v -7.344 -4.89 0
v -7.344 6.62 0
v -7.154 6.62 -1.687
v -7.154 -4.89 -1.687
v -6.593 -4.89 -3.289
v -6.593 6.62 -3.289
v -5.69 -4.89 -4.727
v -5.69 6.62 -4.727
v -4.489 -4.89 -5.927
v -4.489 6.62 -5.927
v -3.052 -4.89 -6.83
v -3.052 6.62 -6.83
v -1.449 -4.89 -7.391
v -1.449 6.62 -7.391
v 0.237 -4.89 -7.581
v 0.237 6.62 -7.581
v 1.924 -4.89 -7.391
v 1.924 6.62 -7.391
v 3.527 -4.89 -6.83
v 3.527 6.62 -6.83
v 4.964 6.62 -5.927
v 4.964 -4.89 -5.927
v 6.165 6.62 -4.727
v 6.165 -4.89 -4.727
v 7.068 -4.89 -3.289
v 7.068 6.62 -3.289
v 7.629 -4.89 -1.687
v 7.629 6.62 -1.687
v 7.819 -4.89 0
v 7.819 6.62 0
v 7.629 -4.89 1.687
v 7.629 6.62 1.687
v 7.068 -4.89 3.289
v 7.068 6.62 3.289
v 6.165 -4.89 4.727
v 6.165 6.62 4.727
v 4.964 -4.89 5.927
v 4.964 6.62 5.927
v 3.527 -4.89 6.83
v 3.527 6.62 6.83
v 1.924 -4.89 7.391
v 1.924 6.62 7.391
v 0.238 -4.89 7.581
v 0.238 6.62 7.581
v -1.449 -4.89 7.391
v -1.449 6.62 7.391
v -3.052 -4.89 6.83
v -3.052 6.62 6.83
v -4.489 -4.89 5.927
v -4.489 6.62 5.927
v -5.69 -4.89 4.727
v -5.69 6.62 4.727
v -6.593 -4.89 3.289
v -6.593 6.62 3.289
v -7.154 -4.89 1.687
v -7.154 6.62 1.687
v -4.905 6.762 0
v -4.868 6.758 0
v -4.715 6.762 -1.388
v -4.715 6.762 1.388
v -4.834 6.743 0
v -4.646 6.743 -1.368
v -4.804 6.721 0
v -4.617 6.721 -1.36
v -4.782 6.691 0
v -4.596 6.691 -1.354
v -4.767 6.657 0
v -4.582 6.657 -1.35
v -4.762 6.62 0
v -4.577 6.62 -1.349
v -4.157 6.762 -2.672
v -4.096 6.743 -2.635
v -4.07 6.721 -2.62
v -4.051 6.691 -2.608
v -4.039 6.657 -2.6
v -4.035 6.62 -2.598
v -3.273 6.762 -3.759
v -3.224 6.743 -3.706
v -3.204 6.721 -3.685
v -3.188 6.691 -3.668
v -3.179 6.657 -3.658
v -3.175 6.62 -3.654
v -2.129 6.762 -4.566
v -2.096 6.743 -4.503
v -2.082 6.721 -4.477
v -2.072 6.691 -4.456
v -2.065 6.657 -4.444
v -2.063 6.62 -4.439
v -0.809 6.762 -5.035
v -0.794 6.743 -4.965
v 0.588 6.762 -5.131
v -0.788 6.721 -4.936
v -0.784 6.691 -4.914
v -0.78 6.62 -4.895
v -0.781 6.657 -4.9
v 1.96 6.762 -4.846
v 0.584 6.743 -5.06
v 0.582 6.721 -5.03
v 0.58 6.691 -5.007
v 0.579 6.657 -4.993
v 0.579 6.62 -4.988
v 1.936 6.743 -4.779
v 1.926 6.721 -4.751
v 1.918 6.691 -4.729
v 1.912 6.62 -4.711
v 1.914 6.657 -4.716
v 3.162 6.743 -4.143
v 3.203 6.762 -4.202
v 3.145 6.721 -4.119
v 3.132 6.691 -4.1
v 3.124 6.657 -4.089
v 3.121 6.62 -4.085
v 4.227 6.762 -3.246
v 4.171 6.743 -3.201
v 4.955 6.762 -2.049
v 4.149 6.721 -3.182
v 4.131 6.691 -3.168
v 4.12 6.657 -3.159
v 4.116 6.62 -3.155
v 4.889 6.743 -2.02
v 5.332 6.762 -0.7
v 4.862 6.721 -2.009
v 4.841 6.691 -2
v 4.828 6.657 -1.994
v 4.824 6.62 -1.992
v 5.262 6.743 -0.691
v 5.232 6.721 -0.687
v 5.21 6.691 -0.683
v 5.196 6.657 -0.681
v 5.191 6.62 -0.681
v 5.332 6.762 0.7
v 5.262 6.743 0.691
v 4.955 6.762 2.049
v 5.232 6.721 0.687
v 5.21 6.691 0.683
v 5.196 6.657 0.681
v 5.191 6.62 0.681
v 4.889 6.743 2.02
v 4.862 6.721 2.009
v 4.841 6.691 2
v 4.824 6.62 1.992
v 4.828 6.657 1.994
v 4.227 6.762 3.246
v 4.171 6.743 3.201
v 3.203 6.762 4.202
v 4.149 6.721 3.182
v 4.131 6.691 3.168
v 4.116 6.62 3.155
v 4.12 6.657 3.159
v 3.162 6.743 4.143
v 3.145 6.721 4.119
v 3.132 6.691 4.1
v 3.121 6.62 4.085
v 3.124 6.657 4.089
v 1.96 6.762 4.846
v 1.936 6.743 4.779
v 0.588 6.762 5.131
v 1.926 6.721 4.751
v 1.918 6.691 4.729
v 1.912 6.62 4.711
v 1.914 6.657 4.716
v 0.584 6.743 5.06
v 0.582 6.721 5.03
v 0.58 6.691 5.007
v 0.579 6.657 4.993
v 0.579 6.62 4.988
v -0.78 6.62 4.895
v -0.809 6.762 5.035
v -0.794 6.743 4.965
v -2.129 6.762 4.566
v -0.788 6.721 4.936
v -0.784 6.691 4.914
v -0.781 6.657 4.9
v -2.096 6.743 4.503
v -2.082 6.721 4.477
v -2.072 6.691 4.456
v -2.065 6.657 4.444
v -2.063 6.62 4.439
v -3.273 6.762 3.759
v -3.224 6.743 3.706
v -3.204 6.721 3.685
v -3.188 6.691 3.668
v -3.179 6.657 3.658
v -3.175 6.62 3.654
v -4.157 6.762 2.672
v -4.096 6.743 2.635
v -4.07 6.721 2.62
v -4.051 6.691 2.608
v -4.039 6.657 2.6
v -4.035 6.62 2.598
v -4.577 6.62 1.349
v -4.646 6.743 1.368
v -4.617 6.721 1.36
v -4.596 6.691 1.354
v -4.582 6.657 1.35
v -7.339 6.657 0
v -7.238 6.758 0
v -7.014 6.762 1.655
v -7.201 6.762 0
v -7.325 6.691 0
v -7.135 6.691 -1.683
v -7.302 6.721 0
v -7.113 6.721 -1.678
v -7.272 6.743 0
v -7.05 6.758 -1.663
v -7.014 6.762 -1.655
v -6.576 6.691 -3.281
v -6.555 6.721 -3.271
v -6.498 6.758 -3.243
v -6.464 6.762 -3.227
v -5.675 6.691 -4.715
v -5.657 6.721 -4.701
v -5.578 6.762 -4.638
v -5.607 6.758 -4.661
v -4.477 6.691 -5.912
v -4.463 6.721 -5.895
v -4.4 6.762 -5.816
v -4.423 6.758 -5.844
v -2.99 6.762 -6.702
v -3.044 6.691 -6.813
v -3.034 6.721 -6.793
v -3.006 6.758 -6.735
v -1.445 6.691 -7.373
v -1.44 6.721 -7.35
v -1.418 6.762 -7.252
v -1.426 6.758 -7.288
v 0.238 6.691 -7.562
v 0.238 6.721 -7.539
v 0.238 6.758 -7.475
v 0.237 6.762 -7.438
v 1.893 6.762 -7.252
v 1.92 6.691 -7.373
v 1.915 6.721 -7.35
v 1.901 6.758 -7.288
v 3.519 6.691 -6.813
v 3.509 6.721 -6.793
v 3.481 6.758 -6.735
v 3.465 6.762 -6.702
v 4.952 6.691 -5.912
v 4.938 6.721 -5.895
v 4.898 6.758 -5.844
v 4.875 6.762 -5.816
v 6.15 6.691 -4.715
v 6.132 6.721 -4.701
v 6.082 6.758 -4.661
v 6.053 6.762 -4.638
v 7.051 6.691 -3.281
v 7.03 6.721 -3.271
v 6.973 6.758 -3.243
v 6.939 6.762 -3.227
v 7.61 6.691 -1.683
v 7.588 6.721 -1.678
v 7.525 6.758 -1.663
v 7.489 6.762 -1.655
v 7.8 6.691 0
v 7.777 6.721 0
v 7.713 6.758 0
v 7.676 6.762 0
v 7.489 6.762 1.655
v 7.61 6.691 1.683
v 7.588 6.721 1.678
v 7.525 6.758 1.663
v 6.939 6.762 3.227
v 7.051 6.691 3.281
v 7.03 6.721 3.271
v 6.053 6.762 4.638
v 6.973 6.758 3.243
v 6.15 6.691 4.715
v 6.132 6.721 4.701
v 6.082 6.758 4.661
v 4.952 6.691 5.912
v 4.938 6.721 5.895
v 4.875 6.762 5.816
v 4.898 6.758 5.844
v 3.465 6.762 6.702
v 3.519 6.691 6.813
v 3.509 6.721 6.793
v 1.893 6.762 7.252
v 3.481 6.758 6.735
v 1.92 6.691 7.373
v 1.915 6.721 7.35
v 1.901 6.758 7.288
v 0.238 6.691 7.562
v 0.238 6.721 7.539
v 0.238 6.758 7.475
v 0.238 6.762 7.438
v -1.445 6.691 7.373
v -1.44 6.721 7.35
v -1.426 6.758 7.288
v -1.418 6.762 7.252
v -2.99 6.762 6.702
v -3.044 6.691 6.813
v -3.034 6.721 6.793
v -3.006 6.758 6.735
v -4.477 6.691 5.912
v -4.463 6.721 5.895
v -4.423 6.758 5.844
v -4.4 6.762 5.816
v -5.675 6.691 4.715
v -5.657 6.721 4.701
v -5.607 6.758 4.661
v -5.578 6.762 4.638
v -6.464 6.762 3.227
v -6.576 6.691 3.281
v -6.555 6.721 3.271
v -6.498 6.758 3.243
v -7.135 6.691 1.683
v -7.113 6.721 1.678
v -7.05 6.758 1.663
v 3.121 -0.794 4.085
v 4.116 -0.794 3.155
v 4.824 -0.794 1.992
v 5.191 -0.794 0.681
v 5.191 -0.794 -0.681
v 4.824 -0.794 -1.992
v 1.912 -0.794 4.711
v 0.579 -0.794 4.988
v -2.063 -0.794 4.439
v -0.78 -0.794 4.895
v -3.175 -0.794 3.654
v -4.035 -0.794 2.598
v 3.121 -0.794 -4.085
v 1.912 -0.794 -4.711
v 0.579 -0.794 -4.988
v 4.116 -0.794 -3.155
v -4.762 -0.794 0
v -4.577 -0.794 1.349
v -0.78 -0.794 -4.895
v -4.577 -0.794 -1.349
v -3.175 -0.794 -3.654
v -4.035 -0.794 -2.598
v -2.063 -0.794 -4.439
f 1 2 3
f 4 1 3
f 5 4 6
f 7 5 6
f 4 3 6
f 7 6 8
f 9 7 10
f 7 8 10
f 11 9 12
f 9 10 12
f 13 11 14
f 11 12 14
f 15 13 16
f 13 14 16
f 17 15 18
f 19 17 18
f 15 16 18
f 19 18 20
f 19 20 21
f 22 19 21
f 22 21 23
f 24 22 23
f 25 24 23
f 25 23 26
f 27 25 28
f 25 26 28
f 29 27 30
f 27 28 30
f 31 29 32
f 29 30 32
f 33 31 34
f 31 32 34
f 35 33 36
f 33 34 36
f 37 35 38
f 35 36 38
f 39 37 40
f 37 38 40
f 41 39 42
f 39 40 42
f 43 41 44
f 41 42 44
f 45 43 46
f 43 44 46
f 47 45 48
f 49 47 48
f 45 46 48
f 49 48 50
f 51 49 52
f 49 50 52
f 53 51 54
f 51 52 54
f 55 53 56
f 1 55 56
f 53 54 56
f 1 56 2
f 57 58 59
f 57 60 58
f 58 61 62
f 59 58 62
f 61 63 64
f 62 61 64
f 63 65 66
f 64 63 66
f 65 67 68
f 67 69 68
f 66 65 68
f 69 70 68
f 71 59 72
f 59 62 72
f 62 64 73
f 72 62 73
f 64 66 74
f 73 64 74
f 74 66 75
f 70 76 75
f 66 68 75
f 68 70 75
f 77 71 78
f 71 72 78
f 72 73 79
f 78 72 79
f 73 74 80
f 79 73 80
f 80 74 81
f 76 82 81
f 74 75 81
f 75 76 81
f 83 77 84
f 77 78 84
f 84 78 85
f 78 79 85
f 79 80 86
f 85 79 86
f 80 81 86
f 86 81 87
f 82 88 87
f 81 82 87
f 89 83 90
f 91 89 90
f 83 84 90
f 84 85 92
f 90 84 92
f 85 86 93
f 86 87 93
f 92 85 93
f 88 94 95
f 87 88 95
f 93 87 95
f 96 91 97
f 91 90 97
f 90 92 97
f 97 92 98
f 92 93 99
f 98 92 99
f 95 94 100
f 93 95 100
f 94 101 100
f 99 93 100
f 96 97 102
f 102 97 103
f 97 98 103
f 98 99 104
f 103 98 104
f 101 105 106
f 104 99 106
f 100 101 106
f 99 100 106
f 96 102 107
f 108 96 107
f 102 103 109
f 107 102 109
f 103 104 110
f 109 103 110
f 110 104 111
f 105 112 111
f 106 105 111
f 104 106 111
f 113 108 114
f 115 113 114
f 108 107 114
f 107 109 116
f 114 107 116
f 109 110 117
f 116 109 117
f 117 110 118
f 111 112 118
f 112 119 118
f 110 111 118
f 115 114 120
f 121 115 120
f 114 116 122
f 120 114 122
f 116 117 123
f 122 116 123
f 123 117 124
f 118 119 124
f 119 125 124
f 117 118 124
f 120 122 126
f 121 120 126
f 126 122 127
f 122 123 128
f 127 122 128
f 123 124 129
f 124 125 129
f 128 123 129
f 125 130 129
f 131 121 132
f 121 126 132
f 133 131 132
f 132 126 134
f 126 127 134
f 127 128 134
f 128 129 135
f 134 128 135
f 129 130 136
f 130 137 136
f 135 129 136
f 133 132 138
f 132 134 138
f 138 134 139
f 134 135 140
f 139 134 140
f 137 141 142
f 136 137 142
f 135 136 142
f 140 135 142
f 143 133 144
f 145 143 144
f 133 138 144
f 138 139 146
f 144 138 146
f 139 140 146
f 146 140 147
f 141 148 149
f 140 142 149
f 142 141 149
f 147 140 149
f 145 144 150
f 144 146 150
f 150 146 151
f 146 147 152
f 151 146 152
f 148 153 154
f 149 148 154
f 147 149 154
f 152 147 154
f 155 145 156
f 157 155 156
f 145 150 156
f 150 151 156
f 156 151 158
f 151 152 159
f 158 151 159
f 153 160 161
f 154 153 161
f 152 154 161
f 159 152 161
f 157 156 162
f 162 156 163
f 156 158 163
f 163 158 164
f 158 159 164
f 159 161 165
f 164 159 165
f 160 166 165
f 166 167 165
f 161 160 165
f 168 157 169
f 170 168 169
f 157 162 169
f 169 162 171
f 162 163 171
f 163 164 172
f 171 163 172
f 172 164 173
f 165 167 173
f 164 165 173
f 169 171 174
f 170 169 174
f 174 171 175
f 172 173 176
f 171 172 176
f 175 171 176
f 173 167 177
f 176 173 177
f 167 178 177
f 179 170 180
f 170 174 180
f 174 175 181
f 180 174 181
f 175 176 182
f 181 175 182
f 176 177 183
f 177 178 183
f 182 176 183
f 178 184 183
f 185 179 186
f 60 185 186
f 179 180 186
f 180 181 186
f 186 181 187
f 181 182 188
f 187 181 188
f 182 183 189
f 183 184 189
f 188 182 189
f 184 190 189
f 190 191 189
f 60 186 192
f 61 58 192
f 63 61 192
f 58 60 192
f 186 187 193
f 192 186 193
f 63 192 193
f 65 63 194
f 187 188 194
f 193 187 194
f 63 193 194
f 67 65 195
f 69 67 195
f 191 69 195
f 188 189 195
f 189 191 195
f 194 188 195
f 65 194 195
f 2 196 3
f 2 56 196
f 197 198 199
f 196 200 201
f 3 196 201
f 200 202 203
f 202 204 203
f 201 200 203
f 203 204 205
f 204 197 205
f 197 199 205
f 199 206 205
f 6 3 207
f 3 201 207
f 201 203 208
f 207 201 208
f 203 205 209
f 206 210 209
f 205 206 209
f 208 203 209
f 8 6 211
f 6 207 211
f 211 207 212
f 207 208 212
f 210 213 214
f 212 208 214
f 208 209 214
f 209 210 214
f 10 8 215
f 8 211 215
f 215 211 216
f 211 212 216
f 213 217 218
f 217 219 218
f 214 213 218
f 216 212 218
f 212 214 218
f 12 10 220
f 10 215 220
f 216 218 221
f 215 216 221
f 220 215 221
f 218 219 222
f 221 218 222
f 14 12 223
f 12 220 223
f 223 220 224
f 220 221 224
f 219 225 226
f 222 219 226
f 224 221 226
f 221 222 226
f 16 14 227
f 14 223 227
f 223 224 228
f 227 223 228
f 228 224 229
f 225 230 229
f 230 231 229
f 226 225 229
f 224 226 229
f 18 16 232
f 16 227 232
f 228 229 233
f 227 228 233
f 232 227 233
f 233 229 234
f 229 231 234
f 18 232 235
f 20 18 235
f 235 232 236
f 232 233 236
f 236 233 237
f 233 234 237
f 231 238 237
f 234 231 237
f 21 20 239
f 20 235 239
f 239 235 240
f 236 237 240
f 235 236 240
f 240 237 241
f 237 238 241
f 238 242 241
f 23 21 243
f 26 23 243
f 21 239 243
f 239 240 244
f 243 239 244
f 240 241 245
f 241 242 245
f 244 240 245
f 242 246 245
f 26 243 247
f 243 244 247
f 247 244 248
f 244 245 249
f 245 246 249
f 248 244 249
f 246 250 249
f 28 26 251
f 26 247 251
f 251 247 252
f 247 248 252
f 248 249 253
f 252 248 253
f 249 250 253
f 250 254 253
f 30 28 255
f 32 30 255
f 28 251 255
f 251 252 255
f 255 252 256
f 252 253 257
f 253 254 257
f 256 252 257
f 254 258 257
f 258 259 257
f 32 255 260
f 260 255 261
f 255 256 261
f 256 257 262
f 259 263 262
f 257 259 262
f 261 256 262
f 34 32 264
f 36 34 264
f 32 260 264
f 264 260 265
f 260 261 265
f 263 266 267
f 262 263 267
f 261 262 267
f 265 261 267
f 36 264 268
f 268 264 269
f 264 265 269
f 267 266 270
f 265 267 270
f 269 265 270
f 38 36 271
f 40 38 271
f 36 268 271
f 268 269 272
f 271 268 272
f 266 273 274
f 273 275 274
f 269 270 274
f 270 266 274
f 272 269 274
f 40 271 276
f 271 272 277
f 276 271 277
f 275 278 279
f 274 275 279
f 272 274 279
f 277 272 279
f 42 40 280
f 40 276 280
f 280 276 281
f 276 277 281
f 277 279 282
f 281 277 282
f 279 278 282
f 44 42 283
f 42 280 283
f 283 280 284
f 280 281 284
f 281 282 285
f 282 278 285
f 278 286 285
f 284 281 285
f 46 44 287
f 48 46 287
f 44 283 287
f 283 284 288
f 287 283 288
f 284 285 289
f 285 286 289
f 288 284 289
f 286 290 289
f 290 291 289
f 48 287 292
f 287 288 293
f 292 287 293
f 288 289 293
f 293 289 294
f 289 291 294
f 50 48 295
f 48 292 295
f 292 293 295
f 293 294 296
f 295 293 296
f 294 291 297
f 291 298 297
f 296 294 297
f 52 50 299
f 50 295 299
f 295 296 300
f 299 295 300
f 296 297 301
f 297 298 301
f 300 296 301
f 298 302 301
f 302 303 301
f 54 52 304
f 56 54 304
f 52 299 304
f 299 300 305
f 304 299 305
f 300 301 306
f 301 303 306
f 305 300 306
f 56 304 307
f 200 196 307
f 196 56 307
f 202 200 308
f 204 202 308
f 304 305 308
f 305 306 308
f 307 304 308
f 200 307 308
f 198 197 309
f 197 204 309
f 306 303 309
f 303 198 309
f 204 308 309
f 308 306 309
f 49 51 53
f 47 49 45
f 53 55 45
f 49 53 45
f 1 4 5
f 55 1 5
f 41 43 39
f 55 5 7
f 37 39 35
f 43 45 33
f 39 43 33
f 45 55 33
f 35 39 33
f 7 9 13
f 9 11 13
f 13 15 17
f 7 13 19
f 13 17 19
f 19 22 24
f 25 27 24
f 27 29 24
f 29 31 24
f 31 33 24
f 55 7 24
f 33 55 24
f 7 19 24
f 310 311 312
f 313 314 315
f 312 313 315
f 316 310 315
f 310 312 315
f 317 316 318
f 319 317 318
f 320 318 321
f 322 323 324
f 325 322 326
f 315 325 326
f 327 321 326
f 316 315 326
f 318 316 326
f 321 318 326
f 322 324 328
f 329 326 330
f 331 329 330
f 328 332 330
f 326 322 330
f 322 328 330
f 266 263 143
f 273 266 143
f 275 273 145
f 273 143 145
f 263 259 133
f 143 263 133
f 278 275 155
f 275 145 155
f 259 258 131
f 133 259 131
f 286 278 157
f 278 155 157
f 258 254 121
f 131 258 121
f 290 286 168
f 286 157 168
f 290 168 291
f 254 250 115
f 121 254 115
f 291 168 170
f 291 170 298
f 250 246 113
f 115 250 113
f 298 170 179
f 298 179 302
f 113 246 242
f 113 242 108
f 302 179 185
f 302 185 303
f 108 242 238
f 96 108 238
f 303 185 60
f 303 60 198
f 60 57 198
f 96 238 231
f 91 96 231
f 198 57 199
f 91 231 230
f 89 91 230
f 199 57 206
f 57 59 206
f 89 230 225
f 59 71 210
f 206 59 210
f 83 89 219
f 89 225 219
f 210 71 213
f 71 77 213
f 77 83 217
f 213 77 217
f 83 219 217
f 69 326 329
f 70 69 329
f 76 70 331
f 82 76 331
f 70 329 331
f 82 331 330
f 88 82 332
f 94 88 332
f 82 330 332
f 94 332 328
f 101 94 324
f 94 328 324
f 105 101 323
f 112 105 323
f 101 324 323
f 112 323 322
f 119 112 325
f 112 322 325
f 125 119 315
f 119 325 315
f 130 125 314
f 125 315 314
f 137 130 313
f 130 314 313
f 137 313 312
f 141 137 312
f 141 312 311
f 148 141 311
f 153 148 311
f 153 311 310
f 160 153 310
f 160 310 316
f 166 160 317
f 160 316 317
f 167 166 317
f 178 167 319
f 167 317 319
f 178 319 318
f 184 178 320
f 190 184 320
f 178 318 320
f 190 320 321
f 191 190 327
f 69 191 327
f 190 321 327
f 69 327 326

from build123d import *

# Parameters (mm, degrees)
FILLET1_R = 0.142875


with BuildPart() as part:
    # Sketch2 → Revolve1 (revolve)
    with BuildSketch(Plane.XY):
        Polygon((-7.34375, -4.88975), (-7.34375, 6.7625), (-4.7625, 6.7625), (-4.7625, -0.79375), (0.2375, -0.79375), (0.2375, -4.88975), align=None)
    revolve(axis=Axis((0.2375, -0.79375, 0), (0, -1, 0)))

    # Fillet1
    fillet1_edges = [part.edges().sort_by_distance(p)[0] for p in [
        (5.2375, 6.7625, 0),
        (7.81875, 6.7625, 0),
    ]]
    fillet(fillet1_edges, radius=FILLET1_R)


solid = part.part
